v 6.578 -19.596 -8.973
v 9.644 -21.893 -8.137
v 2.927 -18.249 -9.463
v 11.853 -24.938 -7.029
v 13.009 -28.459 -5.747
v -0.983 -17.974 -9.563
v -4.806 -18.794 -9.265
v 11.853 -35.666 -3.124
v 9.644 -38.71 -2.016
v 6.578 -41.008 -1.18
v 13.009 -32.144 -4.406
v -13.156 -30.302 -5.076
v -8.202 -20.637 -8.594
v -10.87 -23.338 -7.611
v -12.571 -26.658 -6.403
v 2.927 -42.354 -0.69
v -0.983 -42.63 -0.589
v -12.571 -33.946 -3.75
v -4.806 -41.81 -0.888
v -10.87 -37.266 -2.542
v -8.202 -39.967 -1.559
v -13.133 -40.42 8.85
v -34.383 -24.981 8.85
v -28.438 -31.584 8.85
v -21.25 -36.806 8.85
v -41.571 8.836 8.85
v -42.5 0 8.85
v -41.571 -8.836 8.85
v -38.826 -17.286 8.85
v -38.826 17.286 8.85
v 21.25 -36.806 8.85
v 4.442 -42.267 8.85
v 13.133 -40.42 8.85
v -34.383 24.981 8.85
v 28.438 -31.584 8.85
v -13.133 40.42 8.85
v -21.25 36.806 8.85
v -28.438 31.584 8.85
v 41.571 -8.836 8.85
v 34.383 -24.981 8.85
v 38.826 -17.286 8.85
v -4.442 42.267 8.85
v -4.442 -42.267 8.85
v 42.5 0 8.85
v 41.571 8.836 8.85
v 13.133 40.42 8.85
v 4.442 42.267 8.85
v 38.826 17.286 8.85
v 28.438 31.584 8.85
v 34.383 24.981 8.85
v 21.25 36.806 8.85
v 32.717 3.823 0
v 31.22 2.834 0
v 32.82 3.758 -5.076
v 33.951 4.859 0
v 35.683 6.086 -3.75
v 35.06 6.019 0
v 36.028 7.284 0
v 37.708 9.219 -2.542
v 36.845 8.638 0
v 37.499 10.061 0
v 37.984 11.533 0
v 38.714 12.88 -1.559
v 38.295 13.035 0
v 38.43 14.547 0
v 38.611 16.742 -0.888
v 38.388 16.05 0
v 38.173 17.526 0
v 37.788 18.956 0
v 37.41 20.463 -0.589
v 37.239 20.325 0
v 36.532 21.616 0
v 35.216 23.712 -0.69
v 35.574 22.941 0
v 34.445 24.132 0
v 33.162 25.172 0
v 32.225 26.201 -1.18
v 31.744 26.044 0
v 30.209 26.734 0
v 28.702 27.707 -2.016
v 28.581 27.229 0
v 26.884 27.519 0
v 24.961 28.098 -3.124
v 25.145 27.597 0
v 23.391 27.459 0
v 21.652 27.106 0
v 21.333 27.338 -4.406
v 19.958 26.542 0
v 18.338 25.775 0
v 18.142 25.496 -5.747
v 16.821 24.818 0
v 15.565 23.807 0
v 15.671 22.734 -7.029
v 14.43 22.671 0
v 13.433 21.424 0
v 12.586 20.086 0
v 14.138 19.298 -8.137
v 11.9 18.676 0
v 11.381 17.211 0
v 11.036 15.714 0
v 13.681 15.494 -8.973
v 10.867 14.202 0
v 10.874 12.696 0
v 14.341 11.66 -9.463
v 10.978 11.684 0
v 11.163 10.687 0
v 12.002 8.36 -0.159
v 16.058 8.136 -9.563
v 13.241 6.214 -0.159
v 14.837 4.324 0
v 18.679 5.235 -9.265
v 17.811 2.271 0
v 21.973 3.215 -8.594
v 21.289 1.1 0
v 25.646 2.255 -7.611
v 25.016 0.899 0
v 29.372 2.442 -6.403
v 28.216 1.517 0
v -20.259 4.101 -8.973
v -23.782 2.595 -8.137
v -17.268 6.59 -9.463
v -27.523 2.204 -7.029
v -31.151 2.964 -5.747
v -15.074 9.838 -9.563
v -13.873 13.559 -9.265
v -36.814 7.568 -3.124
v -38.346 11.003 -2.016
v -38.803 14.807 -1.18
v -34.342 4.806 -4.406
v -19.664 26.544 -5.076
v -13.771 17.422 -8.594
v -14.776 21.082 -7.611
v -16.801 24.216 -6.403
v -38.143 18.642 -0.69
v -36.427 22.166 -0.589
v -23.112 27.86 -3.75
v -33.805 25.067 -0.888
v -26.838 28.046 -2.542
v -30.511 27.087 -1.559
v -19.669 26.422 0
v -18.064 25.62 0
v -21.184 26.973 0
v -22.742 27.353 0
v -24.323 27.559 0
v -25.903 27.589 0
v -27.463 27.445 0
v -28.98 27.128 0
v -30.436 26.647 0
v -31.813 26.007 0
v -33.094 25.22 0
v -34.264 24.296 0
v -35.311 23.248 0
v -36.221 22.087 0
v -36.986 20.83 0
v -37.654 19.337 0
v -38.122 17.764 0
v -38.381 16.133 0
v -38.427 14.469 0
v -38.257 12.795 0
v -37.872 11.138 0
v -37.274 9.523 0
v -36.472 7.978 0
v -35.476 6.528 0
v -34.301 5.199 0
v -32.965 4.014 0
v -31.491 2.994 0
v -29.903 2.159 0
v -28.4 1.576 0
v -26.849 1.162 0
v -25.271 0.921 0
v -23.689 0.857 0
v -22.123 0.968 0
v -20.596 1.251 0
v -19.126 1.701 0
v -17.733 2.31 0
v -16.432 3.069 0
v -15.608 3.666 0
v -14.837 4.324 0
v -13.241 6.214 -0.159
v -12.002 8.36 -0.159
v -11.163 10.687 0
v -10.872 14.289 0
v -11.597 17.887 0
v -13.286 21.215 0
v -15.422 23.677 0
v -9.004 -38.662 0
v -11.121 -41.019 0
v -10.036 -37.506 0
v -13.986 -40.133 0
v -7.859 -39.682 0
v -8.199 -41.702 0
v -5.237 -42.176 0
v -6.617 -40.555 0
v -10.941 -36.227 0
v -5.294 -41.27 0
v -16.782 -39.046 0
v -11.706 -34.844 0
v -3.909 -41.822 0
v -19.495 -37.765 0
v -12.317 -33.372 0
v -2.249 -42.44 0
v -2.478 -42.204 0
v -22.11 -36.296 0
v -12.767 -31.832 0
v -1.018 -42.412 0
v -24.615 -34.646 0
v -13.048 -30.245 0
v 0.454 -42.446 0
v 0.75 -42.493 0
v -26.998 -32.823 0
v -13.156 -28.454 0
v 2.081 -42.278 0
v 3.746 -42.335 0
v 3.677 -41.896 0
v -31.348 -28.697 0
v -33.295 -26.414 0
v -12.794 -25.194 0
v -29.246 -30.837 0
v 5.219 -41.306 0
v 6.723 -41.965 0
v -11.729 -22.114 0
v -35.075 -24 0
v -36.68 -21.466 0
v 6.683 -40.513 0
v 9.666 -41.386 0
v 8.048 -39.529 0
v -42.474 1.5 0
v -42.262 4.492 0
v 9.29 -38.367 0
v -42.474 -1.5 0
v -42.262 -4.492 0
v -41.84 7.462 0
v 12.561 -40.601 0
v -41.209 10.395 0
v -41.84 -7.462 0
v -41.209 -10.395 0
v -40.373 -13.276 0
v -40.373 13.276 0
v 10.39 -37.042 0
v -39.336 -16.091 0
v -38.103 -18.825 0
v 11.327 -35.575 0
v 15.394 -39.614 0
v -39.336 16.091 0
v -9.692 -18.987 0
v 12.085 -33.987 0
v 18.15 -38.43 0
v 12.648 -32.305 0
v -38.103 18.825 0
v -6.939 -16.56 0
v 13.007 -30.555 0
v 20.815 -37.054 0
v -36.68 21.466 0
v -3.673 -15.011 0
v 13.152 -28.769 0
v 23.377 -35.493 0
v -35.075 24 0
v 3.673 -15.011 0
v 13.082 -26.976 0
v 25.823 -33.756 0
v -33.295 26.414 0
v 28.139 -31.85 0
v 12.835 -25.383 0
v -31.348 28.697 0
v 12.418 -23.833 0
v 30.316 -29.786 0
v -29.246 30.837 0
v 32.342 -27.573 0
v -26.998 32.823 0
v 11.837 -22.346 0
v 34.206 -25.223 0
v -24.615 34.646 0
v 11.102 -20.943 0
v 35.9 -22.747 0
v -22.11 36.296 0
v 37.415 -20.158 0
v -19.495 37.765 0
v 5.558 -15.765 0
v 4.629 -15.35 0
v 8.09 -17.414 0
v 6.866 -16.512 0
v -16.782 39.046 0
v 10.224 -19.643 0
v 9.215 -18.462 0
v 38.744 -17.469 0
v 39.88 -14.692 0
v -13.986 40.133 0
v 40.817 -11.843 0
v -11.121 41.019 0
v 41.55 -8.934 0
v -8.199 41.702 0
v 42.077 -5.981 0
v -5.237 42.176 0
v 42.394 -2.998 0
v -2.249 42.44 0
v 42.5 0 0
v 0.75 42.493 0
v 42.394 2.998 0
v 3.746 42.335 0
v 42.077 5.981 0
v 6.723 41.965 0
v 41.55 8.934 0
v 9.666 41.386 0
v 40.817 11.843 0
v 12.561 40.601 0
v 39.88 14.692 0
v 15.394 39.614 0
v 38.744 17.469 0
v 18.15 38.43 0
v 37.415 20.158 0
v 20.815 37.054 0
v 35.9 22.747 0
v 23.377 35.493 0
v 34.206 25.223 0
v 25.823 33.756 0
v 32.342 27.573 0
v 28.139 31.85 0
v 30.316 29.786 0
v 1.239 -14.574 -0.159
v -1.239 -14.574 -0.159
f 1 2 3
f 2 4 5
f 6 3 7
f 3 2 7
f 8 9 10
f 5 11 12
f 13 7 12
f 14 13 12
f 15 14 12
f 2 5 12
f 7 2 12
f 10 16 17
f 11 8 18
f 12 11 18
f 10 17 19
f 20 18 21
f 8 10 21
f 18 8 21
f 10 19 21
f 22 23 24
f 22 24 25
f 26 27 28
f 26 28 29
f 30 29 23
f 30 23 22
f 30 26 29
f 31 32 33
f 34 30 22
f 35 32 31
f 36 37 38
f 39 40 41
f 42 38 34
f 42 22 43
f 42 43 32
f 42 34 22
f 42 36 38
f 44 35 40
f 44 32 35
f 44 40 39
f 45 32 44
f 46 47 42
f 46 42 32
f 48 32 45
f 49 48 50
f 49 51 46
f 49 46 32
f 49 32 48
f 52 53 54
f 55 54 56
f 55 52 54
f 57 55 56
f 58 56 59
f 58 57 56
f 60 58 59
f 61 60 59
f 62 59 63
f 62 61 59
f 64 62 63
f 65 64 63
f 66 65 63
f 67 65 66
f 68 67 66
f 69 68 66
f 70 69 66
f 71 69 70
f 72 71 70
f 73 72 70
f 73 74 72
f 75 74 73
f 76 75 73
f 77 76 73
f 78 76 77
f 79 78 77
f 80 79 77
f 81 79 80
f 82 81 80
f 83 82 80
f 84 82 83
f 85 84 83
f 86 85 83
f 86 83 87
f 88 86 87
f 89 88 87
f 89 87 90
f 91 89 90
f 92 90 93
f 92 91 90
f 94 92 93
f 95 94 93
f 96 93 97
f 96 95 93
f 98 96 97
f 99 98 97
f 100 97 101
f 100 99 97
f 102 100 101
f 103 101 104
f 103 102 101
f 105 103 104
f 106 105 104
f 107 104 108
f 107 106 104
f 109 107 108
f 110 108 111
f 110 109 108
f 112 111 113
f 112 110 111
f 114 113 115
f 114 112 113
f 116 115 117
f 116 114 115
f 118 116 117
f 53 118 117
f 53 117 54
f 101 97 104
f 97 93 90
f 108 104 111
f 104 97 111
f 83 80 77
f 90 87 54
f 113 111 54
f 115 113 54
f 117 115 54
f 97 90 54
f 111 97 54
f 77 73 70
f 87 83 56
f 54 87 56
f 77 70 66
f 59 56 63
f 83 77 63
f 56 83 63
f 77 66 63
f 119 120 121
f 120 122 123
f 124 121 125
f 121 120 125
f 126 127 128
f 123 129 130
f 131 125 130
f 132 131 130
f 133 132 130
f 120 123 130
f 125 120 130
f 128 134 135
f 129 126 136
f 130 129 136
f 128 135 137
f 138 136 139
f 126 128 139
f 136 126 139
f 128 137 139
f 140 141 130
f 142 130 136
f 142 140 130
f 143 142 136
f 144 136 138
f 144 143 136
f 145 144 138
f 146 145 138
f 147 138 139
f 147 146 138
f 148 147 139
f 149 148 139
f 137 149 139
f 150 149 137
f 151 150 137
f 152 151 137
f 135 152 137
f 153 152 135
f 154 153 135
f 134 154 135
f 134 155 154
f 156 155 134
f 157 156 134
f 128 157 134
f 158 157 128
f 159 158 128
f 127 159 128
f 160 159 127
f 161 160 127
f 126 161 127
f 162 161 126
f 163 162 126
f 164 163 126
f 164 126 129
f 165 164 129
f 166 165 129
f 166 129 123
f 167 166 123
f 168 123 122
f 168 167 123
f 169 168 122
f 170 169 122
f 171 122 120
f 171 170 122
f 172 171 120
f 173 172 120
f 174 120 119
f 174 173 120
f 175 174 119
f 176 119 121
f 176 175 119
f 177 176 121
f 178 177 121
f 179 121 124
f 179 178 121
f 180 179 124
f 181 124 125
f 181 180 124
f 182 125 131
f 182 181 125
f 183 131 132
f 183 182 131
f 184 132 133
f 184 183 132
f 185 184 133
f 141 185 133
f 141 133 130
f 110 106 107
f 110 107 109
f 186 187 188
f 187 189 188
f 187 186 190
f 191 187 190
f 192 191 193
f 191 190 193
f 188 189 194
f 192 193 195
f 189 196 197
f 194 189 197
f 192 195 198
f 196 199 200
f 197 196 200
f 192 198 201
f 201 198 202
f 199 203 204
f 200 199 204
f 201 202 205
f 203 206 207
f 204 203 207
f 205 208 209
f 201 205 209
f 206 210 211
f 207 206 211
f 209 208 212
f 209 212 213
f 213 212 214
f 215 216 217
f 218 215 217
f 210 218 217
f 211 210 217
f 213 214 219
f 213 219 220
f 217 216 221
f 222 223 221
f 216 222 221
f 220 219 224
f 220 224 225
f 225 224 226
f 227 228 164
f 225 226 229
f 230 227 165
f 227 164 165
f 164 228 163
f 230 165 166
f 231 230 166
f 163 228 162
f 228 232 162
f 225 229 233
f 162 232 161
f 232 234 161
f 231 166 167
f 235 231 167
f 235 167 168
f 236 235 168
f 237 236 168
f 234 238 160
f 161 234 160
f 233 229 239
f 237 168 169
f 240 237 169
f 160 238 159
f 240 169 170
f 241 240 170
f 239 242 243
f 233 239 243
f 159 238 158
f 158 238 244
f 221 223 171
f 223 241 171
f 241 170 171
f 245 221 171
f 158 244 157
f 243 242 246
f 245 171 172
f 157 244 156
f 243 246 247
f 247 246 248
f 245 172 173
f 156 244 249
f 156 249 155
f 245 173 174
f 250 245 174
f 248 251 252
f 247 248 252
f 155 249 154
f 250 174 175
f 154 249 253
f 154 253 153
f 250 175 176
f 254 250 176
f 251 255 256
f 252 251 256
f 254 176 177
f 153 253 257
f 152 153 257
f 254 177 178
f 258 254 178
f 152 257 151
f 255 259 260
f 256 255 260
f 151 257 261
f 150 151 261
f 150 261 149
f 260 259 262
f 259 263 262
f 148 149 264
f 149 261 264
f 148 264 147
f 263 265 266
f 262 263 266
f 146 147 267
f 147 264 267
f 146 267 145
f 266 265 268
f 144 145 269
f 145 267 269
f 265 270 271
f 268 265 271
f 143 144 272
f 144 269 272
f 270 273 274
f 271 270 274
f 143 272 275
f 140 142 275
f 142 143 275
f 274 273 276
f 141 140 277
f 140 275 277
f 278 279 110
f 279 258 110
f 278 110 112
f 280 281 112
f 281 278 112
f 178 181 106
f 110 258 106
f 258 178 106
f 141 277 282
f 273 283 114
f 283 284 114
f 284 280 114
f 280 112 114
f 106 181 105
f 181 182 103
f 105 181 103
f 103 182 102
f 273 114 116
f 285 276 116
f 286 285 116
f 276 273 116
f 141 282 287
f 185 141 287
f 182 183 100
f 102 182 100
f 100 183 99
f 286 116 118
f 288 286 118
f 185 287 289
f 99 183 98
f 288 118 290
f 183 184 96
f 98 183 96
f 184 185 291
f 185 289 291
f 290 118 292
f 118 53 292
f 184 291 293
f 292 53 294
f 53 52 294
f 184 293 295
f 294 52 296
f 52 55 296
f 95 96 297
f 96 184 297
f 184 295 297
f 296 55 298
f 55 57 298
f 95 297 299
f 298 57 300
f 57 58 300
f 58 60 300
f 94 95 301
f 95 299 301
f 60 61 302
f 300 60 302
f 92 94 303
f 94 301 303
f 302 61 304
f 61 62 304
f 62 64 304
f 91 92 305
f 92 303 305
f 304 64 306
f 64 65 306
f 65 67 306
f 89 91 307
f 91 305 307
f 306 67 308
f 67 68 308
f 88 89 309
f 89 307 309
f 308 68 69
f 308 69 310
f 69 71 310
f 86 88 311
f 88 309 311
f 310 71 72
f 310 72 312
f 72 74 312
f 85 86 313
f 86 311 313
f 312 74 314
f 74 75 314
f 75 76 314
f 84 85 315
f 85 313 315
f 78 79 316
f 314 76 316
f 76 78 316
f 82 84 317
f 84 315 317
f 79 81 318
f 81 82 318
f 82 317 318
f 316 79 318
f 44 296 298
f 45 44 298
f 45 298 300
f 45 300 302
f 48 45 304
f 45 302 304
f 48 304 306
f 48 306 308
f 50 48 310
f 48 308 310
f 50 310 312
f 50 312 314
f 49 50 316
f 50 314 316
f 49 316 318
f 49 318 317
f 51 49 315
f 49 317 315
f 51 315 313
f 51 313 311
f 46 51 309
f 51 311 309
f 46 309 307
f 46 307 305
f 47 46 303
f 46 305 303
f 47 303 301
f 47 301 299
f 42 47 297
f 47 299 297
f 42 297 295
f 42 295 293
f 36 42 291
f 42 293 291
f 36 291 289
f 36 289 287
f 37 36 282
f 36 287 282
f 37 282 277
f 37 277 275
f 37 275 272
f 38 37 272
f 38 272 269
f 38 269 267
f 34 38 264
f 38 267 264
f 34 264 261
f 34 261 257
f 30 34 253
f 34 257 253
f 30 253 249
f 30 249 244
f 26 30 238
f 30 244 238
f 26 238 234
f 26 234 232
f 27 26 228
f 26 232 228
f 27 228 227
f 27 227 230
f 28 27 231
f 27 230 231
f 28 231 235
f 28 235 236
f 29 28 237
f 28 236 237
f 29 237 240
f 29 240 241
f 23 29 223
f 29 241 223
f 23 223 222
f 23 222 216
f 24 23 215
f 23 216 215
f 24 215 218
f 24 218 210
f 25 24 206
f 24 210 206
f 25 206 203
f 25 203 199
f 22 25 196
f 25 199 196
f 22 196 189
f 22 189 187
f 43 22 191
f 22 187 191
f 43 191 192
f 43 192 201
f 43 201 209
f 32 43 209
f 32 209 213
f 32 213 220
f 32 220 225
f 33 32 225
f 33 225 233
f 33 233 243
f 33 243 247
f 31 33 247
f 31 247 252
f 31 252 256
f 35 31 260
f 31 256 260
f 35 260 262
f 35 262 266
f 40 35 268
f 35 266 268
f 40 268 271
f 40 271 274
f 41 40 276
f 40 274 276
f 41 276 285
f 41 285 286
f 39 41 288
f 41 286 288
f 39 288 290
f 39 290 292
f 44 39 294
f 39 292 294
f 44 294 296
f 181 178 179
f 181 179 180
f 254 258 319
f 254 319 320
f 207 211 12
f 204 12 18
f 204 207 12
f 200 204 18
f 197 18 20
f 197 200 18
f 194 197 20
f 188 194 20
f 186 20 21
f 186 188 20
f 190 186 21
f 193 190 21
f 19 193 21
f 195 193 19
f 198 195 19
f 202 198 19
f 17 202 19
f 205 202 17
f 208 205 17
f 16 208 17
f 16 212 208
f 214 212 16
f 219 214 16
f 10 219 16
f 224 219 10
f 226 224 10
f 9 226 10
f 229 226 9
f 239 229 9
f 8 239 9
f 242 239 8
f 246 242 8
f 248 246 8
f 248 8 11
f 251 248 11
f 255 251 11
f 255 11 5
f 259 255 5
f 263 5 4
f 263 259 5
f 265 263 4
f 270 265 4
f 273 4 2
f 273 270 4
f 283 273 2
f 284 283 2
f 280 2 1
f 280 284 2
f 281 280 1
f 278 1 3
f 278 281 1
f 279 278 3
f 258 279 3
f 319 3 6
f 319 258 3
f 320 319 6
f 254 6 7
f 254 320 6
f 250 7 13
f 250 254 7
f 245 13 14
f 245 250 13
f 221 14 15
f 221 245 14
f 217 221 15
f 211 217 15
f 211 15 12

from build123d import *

# Parameters (mm, degrees)
SKETCH1_R           = 42.5
BOSS_EXTRUDE1_DEPTH = 8.85
BOSS_EXTRUDE2_START = -10
SKETCH6_R           = 13.155696691
BOSS_EXTRUDE2_DEPTH = 10
CIRPATTERN1_COUNT   = 3


with BuildPart() as part:
    # Sketch1 → Boss-Extrude1 (new body)
    with BuildSketch(Plane.XY):
        Circle(SKETCH1_R)
    extrude(amount=BOSS_EXTRUDE1_DEPTH)

    # Sketch6 → Boss-Extrude2 (add)
    with BuildSketch(Plane(origin=(0, 1.664252335, 4.57249571), x_dir=(-1, 0, 0), z_dir=(-2.371601618479234e-15, 0.34202014332567576, 0.9396926207859059)).offset(BOSS_EXTRUDE2_START)):
        with Locations((0, 26.738166151)):
            Circle(SKETCH6_R)
    boss_extrude2 = extrude(amount=-BOSS_EXTRUDE2_DEPTH)

    # CirPattern1: Boss-Extrude2 ×3 about axis
    cirpattern1_axis = Axis((0, 0, 8.85), (0, 0, -1))
    for i in range(1, CIRPATTERN1_COUNT):
        add(boss_extrude2.rotate(cirpattern1_axis, i * 360 / CIRPATTERN1_COUNT))


solid = part.part
